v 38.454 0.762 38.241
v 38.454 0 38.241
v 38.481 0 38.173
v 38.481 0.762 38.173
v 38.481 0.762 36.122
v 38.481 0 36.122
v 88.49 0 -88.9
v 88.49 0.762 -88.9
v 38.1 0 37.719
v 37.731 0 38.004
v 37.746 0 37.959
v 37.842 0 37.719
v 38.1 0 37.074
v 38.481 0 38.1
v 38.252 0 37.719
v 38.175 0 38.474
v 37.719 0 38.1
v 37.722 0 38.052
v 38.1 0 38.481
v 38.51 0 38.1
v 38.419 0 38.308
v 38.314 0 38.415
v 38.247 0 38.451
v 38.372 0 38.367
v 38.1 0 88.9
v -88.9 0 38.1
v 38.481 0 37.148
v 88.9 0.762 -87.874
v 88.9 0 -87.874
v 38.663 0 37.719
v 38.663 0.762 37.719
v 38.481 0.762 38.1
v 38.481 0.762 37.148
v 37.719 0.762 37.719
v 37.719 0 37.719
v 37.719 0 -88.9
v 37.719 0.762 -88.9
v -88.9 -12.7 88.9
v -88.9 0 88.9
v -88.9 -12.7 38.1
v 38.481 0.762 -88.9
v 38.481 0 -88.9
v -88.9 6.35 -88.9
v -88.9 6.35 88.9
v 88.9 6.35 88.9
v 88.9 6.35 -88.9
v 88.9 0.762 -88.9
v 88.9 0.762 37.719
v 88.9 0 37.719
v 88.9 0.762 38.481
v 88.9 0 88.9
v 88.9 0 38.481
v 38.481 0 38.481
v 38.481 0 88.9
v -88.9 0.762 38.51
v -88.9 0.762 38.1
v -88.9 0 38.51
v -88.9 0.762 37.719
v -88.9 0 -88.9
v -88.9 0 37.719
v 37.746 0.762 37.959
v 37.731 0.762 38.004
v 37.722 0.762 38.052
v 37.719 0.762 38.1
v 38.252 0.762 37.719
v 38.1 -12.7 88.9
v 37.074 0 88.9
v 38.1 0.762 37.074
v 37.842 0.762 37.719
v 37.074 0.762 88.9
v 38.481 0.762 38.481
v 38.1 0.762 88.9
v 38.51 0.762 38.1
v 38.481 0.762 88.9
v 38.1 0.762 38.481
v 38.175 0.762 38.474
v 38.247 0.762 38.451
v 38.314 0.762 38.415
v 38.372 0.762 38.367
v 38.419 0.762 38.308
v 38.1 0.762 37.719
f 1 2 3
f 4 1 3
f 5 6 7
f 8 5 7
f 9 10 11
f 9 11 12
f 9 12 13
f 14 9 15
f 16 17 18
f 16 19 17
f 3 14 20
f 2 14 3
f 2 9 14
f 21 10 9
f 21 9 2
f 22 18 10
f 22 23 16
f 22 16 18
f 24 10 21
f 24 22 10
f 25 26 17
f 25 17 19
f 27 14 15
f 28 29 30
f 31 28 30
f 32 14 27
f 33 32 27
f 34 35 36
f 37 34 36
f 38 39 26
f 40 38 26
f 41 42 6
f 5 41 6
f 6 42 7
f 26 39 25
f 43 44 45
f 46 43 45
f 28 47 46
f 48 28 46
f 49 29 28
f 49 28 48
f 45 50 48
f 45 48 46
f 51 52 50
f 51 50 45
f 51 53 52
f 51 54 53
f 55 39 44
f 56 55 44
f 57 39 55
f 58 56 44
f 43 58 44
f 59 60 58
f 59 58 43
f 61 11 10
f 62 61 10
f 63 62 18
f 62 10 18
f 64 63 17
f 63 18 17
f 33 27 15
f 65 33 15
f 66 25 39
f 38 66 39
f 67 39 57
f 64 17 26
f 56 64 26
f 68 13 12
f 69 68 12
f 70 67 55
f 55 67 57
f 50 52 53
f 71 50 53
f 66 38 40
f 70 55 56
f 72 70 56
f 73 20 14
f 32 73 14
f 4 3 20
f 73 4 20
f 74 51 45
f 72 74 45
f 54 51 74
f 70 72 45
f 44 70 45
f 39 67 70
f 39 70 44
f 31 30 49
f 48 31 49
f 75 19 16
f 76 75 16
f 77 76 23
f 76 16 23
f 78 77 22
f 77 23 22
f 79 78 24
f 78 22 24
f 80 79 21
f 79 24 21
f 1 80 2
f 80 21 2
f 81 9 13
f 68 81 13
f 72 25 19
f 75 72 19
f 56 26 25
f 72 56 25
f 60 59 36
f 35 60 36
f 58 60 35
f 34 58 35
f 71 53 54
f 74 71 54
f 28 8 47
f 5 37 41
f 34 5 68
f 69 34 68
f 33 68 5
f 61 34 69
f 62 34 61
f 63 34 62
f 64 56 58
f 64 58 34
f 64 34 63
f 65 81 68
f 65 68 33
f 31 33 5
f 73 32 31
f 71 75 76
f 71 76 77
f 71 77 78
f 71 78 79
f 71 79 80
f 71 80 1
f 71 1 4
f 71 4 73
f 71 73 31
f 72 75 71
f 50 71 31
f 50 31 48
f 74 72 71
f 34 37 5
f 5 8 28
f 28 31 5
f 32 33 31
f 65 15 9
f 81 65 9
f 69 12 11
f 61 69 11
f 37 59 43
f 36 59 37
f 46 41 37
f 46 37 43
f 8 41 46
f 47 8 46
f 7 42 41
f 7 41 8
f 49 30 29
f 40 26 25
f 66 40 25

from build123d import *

# Parameters (mm, degrees)
F1_DEPTH = 6.35
F2_DEPTH = 12.7
F4_DEPTH = 0.762


with BuildPart() as f1:
    # F0 (on Front) → F1 (new body)
    with BuildSketch(Plane.XZ):
        Polygon((88.9, -88.9), (88.9, 88.9), (38.1, 88.9), (-88.9, 38.1), (-88.9, -88.9), align=None)
        Polygon((-88.9, 38.1), (38.1, 88.9), (-88.9, 88.9), align=None)
    extrude(amount=-F1_DEPTH)

    # F3 (on face) → F4 (cut)
    with BuildSketch(Plane.XZ):
        with BuildLine():
            Line((37.719, 37.719), (37.719, 38.1))
            Line((37.719, 38.1), (-87.8741261042, 38.1))
            Line((-87.8741261042, 38.1), (-88.7585001523, 37.7462503808))
            ThreePointArc((-88.7585001523, 37.7462503808), (-88.8279500344, 37.7258746167), (-88.9, 37.719))
            Line((-88.9, 37.719), (37.719, 37.719))
        make_face()
        with BuildLine():
            ThreePointArc((37.7462503808, 37.9585001523), (37.7258746167, 38.0279500344), (37.719, 38.1))
            Line((37.719, 38.1), (37.719, 37.719))
            Line((37.719, 37.719), (37.8420504417, 37.719))
            Line((37.8420504417, 37.719), (37.7462503808, 37.9585001523))
        make_face()
        with BuildLine():
            Line((-88.7585001523, 37.7462503808), (-87.8741261042, 38.1))
            Line((-87.8741261042, 38.1), (-88.9, 38.1))
            Line((-88.9, 38.1), (-87.9475, 38.481))
            Line((-87.9475, 38.481), (-88.9, 38.481))
            ThreePointArc((-88.9, 38.481), (-88.9720499656, 38.4741253833), (-89.0414998477, 38.4537496192))
            ThreePointArc((-89.0414998477, 38.4537496192), (-89.2741253833, 38.0279500344), (-88.9, 37.719))
            ThreePointArc((-88.9, 37.719), (-88.8279500344, 37.7258746167), (-88.7585001523, 37.7462503808))
        make_face()
        with BuildLine():
            Line((38.1, 88.4896504417), (38.1, 38.481))
            Line((38.1, 38.481), (38.481, 38.481))
            Line((38.481, 38.481), (38.481, 88.9))
            ThreePointArc((38.481, 88.9), (38.4154936148, 88.6864004237), (38.2414998477, 88.5462503808))
            Line((38.2414998477, 88.5462503808), (38.1, 88.4896504417))
        make_face()
        with BuildLine():
            Line((38.481, 38.481), (38.1, 38.481))
            ThreePointArc((38.1, 38.481), (38.3135995763, 38.4154936148), (38.4537496192, 38.2414998477))
            Line((38.4537496192, 38.2414998477), (38.481, 38.1733738958))
            Line((38.481, 38.1733738958), (38.481, 38.481))
        make_face()
        with BuildLine():
            Line((37.8420504417, 37.719), (37.719, 37.719))
            Line((37.719, 37.719), (37.719, -88.9))
            ThreePointArc((37.719, -88.9), (38.1, -89.281), (38.481, -88.9))
            Line((38.481, -88.9), (38.481, 36.1216261042))
            Line((38.481, 36.1216261042), (38.1, 37.0741261042))
            Line((38.1, 37.0741261042), (37.8420504417, 37.719))
        make_face()
        Polygon((38.5103495583, 38.1), (38.481, 38.1), (38.481, 37.719), (38.6627495583, 37.719), align=None)
        Polygon((38.2524, 37.719), (38.1, 37.719), (38.1, 37.0741261042), (38.481, 36.1216261042), (38.481, 37.1475), align=None)
        with BuildLine():
            Line((38.1, 88.9), (38.1, 88.4896504417))
            Line((38.1, 88.4896504417), (38.2414998477, 88.5462503808))
            ThreePointArc((38.2414998477, 88.5462503808), (38.4154936148, 88.6864004237), (38.481, 88.9))
            ThreePointArc((38.481, 88.9), (38.3135995763, 89.2154936148), (37.9585001523, 89.2537496192))
            ThreePointArc((37.9585001523, 89.2537496192), (37.7845063852, 89.1135995763), (37.719, 88.9))
            Line((37.719, 88.9), (37.719, 88.7476))
            Line((37.719, 88.7476), (38.1, 88.9))
        make_face()
        with BuildLine():
            Line((88.9, 38.481), (38.481, 38.481))
            Line((38.481, 38.481), (38.481, 38.1733738958))
            Line((38.481, 38.1733738958), (38.5103495583, 38.1))
            Line((38.5103495583, 38.1), (38.6627495583, 37.719))
            Line((38.6627495583, 37.719), (88.9, 37.719))
            ThreePointArc((88.9, 37.719), (89.281, 38.1), (88.9, 38.481))
        make_face()
        with BuildLine():
            Line((38.6627495583, 37.719), (38.481, 37.719))
            Line((38.481, 37.719), (38.481, 37.1475))
            Line((38.481, 37.1475), (38.481, 36.1216261042))
            Line((38.481, 36.1216261042), (88.5462503808, -89.0414998477))
            ThreePointArc((88.5462503808, -89.0414998477), (89.0414998477, -89.2537496192), (89.2537496192, -88.7585001523))
            Line((89.2537496192, -88.7585001523), (38.6627495583, 37.719))
        make_face()
        with BuildLine():
            Line((-88.9, 38.481), (-87.9475, 38.481))
            Line((-87.9475, 38.481), (37.719, 88.7476))
            Line((37.719, 88.7476), (37.719, 88.9))
            ThreePointArc((37.719, 88.9), (37.7845063852, 89.1135995763), (37.9585001523, 89.2537496192))
            Line((37.9585001523, 89.2537496192), (-89.0414998477, 38.4537496192))
            ThreePointArc((-89.0414998477, 38.4537496192), (-88.9720499656, 38.4741253833), (-88.9, 38.481))
        make_face()
    extrude(amount=-F4_DEPTH, mode=Mode.SUBTRACT)


with BuildPart() as f2:
    # F0 (on Front) → F2 (new body)
    with BuildSketch(Plane.XZ):
        Polygon((-88.9, 38.1), (38.1, 88.9), (-88.9, 88.9), align=None)
    extrude(amount=F2_DEPTH)


solid = Compound([f1.part, f2.part])
